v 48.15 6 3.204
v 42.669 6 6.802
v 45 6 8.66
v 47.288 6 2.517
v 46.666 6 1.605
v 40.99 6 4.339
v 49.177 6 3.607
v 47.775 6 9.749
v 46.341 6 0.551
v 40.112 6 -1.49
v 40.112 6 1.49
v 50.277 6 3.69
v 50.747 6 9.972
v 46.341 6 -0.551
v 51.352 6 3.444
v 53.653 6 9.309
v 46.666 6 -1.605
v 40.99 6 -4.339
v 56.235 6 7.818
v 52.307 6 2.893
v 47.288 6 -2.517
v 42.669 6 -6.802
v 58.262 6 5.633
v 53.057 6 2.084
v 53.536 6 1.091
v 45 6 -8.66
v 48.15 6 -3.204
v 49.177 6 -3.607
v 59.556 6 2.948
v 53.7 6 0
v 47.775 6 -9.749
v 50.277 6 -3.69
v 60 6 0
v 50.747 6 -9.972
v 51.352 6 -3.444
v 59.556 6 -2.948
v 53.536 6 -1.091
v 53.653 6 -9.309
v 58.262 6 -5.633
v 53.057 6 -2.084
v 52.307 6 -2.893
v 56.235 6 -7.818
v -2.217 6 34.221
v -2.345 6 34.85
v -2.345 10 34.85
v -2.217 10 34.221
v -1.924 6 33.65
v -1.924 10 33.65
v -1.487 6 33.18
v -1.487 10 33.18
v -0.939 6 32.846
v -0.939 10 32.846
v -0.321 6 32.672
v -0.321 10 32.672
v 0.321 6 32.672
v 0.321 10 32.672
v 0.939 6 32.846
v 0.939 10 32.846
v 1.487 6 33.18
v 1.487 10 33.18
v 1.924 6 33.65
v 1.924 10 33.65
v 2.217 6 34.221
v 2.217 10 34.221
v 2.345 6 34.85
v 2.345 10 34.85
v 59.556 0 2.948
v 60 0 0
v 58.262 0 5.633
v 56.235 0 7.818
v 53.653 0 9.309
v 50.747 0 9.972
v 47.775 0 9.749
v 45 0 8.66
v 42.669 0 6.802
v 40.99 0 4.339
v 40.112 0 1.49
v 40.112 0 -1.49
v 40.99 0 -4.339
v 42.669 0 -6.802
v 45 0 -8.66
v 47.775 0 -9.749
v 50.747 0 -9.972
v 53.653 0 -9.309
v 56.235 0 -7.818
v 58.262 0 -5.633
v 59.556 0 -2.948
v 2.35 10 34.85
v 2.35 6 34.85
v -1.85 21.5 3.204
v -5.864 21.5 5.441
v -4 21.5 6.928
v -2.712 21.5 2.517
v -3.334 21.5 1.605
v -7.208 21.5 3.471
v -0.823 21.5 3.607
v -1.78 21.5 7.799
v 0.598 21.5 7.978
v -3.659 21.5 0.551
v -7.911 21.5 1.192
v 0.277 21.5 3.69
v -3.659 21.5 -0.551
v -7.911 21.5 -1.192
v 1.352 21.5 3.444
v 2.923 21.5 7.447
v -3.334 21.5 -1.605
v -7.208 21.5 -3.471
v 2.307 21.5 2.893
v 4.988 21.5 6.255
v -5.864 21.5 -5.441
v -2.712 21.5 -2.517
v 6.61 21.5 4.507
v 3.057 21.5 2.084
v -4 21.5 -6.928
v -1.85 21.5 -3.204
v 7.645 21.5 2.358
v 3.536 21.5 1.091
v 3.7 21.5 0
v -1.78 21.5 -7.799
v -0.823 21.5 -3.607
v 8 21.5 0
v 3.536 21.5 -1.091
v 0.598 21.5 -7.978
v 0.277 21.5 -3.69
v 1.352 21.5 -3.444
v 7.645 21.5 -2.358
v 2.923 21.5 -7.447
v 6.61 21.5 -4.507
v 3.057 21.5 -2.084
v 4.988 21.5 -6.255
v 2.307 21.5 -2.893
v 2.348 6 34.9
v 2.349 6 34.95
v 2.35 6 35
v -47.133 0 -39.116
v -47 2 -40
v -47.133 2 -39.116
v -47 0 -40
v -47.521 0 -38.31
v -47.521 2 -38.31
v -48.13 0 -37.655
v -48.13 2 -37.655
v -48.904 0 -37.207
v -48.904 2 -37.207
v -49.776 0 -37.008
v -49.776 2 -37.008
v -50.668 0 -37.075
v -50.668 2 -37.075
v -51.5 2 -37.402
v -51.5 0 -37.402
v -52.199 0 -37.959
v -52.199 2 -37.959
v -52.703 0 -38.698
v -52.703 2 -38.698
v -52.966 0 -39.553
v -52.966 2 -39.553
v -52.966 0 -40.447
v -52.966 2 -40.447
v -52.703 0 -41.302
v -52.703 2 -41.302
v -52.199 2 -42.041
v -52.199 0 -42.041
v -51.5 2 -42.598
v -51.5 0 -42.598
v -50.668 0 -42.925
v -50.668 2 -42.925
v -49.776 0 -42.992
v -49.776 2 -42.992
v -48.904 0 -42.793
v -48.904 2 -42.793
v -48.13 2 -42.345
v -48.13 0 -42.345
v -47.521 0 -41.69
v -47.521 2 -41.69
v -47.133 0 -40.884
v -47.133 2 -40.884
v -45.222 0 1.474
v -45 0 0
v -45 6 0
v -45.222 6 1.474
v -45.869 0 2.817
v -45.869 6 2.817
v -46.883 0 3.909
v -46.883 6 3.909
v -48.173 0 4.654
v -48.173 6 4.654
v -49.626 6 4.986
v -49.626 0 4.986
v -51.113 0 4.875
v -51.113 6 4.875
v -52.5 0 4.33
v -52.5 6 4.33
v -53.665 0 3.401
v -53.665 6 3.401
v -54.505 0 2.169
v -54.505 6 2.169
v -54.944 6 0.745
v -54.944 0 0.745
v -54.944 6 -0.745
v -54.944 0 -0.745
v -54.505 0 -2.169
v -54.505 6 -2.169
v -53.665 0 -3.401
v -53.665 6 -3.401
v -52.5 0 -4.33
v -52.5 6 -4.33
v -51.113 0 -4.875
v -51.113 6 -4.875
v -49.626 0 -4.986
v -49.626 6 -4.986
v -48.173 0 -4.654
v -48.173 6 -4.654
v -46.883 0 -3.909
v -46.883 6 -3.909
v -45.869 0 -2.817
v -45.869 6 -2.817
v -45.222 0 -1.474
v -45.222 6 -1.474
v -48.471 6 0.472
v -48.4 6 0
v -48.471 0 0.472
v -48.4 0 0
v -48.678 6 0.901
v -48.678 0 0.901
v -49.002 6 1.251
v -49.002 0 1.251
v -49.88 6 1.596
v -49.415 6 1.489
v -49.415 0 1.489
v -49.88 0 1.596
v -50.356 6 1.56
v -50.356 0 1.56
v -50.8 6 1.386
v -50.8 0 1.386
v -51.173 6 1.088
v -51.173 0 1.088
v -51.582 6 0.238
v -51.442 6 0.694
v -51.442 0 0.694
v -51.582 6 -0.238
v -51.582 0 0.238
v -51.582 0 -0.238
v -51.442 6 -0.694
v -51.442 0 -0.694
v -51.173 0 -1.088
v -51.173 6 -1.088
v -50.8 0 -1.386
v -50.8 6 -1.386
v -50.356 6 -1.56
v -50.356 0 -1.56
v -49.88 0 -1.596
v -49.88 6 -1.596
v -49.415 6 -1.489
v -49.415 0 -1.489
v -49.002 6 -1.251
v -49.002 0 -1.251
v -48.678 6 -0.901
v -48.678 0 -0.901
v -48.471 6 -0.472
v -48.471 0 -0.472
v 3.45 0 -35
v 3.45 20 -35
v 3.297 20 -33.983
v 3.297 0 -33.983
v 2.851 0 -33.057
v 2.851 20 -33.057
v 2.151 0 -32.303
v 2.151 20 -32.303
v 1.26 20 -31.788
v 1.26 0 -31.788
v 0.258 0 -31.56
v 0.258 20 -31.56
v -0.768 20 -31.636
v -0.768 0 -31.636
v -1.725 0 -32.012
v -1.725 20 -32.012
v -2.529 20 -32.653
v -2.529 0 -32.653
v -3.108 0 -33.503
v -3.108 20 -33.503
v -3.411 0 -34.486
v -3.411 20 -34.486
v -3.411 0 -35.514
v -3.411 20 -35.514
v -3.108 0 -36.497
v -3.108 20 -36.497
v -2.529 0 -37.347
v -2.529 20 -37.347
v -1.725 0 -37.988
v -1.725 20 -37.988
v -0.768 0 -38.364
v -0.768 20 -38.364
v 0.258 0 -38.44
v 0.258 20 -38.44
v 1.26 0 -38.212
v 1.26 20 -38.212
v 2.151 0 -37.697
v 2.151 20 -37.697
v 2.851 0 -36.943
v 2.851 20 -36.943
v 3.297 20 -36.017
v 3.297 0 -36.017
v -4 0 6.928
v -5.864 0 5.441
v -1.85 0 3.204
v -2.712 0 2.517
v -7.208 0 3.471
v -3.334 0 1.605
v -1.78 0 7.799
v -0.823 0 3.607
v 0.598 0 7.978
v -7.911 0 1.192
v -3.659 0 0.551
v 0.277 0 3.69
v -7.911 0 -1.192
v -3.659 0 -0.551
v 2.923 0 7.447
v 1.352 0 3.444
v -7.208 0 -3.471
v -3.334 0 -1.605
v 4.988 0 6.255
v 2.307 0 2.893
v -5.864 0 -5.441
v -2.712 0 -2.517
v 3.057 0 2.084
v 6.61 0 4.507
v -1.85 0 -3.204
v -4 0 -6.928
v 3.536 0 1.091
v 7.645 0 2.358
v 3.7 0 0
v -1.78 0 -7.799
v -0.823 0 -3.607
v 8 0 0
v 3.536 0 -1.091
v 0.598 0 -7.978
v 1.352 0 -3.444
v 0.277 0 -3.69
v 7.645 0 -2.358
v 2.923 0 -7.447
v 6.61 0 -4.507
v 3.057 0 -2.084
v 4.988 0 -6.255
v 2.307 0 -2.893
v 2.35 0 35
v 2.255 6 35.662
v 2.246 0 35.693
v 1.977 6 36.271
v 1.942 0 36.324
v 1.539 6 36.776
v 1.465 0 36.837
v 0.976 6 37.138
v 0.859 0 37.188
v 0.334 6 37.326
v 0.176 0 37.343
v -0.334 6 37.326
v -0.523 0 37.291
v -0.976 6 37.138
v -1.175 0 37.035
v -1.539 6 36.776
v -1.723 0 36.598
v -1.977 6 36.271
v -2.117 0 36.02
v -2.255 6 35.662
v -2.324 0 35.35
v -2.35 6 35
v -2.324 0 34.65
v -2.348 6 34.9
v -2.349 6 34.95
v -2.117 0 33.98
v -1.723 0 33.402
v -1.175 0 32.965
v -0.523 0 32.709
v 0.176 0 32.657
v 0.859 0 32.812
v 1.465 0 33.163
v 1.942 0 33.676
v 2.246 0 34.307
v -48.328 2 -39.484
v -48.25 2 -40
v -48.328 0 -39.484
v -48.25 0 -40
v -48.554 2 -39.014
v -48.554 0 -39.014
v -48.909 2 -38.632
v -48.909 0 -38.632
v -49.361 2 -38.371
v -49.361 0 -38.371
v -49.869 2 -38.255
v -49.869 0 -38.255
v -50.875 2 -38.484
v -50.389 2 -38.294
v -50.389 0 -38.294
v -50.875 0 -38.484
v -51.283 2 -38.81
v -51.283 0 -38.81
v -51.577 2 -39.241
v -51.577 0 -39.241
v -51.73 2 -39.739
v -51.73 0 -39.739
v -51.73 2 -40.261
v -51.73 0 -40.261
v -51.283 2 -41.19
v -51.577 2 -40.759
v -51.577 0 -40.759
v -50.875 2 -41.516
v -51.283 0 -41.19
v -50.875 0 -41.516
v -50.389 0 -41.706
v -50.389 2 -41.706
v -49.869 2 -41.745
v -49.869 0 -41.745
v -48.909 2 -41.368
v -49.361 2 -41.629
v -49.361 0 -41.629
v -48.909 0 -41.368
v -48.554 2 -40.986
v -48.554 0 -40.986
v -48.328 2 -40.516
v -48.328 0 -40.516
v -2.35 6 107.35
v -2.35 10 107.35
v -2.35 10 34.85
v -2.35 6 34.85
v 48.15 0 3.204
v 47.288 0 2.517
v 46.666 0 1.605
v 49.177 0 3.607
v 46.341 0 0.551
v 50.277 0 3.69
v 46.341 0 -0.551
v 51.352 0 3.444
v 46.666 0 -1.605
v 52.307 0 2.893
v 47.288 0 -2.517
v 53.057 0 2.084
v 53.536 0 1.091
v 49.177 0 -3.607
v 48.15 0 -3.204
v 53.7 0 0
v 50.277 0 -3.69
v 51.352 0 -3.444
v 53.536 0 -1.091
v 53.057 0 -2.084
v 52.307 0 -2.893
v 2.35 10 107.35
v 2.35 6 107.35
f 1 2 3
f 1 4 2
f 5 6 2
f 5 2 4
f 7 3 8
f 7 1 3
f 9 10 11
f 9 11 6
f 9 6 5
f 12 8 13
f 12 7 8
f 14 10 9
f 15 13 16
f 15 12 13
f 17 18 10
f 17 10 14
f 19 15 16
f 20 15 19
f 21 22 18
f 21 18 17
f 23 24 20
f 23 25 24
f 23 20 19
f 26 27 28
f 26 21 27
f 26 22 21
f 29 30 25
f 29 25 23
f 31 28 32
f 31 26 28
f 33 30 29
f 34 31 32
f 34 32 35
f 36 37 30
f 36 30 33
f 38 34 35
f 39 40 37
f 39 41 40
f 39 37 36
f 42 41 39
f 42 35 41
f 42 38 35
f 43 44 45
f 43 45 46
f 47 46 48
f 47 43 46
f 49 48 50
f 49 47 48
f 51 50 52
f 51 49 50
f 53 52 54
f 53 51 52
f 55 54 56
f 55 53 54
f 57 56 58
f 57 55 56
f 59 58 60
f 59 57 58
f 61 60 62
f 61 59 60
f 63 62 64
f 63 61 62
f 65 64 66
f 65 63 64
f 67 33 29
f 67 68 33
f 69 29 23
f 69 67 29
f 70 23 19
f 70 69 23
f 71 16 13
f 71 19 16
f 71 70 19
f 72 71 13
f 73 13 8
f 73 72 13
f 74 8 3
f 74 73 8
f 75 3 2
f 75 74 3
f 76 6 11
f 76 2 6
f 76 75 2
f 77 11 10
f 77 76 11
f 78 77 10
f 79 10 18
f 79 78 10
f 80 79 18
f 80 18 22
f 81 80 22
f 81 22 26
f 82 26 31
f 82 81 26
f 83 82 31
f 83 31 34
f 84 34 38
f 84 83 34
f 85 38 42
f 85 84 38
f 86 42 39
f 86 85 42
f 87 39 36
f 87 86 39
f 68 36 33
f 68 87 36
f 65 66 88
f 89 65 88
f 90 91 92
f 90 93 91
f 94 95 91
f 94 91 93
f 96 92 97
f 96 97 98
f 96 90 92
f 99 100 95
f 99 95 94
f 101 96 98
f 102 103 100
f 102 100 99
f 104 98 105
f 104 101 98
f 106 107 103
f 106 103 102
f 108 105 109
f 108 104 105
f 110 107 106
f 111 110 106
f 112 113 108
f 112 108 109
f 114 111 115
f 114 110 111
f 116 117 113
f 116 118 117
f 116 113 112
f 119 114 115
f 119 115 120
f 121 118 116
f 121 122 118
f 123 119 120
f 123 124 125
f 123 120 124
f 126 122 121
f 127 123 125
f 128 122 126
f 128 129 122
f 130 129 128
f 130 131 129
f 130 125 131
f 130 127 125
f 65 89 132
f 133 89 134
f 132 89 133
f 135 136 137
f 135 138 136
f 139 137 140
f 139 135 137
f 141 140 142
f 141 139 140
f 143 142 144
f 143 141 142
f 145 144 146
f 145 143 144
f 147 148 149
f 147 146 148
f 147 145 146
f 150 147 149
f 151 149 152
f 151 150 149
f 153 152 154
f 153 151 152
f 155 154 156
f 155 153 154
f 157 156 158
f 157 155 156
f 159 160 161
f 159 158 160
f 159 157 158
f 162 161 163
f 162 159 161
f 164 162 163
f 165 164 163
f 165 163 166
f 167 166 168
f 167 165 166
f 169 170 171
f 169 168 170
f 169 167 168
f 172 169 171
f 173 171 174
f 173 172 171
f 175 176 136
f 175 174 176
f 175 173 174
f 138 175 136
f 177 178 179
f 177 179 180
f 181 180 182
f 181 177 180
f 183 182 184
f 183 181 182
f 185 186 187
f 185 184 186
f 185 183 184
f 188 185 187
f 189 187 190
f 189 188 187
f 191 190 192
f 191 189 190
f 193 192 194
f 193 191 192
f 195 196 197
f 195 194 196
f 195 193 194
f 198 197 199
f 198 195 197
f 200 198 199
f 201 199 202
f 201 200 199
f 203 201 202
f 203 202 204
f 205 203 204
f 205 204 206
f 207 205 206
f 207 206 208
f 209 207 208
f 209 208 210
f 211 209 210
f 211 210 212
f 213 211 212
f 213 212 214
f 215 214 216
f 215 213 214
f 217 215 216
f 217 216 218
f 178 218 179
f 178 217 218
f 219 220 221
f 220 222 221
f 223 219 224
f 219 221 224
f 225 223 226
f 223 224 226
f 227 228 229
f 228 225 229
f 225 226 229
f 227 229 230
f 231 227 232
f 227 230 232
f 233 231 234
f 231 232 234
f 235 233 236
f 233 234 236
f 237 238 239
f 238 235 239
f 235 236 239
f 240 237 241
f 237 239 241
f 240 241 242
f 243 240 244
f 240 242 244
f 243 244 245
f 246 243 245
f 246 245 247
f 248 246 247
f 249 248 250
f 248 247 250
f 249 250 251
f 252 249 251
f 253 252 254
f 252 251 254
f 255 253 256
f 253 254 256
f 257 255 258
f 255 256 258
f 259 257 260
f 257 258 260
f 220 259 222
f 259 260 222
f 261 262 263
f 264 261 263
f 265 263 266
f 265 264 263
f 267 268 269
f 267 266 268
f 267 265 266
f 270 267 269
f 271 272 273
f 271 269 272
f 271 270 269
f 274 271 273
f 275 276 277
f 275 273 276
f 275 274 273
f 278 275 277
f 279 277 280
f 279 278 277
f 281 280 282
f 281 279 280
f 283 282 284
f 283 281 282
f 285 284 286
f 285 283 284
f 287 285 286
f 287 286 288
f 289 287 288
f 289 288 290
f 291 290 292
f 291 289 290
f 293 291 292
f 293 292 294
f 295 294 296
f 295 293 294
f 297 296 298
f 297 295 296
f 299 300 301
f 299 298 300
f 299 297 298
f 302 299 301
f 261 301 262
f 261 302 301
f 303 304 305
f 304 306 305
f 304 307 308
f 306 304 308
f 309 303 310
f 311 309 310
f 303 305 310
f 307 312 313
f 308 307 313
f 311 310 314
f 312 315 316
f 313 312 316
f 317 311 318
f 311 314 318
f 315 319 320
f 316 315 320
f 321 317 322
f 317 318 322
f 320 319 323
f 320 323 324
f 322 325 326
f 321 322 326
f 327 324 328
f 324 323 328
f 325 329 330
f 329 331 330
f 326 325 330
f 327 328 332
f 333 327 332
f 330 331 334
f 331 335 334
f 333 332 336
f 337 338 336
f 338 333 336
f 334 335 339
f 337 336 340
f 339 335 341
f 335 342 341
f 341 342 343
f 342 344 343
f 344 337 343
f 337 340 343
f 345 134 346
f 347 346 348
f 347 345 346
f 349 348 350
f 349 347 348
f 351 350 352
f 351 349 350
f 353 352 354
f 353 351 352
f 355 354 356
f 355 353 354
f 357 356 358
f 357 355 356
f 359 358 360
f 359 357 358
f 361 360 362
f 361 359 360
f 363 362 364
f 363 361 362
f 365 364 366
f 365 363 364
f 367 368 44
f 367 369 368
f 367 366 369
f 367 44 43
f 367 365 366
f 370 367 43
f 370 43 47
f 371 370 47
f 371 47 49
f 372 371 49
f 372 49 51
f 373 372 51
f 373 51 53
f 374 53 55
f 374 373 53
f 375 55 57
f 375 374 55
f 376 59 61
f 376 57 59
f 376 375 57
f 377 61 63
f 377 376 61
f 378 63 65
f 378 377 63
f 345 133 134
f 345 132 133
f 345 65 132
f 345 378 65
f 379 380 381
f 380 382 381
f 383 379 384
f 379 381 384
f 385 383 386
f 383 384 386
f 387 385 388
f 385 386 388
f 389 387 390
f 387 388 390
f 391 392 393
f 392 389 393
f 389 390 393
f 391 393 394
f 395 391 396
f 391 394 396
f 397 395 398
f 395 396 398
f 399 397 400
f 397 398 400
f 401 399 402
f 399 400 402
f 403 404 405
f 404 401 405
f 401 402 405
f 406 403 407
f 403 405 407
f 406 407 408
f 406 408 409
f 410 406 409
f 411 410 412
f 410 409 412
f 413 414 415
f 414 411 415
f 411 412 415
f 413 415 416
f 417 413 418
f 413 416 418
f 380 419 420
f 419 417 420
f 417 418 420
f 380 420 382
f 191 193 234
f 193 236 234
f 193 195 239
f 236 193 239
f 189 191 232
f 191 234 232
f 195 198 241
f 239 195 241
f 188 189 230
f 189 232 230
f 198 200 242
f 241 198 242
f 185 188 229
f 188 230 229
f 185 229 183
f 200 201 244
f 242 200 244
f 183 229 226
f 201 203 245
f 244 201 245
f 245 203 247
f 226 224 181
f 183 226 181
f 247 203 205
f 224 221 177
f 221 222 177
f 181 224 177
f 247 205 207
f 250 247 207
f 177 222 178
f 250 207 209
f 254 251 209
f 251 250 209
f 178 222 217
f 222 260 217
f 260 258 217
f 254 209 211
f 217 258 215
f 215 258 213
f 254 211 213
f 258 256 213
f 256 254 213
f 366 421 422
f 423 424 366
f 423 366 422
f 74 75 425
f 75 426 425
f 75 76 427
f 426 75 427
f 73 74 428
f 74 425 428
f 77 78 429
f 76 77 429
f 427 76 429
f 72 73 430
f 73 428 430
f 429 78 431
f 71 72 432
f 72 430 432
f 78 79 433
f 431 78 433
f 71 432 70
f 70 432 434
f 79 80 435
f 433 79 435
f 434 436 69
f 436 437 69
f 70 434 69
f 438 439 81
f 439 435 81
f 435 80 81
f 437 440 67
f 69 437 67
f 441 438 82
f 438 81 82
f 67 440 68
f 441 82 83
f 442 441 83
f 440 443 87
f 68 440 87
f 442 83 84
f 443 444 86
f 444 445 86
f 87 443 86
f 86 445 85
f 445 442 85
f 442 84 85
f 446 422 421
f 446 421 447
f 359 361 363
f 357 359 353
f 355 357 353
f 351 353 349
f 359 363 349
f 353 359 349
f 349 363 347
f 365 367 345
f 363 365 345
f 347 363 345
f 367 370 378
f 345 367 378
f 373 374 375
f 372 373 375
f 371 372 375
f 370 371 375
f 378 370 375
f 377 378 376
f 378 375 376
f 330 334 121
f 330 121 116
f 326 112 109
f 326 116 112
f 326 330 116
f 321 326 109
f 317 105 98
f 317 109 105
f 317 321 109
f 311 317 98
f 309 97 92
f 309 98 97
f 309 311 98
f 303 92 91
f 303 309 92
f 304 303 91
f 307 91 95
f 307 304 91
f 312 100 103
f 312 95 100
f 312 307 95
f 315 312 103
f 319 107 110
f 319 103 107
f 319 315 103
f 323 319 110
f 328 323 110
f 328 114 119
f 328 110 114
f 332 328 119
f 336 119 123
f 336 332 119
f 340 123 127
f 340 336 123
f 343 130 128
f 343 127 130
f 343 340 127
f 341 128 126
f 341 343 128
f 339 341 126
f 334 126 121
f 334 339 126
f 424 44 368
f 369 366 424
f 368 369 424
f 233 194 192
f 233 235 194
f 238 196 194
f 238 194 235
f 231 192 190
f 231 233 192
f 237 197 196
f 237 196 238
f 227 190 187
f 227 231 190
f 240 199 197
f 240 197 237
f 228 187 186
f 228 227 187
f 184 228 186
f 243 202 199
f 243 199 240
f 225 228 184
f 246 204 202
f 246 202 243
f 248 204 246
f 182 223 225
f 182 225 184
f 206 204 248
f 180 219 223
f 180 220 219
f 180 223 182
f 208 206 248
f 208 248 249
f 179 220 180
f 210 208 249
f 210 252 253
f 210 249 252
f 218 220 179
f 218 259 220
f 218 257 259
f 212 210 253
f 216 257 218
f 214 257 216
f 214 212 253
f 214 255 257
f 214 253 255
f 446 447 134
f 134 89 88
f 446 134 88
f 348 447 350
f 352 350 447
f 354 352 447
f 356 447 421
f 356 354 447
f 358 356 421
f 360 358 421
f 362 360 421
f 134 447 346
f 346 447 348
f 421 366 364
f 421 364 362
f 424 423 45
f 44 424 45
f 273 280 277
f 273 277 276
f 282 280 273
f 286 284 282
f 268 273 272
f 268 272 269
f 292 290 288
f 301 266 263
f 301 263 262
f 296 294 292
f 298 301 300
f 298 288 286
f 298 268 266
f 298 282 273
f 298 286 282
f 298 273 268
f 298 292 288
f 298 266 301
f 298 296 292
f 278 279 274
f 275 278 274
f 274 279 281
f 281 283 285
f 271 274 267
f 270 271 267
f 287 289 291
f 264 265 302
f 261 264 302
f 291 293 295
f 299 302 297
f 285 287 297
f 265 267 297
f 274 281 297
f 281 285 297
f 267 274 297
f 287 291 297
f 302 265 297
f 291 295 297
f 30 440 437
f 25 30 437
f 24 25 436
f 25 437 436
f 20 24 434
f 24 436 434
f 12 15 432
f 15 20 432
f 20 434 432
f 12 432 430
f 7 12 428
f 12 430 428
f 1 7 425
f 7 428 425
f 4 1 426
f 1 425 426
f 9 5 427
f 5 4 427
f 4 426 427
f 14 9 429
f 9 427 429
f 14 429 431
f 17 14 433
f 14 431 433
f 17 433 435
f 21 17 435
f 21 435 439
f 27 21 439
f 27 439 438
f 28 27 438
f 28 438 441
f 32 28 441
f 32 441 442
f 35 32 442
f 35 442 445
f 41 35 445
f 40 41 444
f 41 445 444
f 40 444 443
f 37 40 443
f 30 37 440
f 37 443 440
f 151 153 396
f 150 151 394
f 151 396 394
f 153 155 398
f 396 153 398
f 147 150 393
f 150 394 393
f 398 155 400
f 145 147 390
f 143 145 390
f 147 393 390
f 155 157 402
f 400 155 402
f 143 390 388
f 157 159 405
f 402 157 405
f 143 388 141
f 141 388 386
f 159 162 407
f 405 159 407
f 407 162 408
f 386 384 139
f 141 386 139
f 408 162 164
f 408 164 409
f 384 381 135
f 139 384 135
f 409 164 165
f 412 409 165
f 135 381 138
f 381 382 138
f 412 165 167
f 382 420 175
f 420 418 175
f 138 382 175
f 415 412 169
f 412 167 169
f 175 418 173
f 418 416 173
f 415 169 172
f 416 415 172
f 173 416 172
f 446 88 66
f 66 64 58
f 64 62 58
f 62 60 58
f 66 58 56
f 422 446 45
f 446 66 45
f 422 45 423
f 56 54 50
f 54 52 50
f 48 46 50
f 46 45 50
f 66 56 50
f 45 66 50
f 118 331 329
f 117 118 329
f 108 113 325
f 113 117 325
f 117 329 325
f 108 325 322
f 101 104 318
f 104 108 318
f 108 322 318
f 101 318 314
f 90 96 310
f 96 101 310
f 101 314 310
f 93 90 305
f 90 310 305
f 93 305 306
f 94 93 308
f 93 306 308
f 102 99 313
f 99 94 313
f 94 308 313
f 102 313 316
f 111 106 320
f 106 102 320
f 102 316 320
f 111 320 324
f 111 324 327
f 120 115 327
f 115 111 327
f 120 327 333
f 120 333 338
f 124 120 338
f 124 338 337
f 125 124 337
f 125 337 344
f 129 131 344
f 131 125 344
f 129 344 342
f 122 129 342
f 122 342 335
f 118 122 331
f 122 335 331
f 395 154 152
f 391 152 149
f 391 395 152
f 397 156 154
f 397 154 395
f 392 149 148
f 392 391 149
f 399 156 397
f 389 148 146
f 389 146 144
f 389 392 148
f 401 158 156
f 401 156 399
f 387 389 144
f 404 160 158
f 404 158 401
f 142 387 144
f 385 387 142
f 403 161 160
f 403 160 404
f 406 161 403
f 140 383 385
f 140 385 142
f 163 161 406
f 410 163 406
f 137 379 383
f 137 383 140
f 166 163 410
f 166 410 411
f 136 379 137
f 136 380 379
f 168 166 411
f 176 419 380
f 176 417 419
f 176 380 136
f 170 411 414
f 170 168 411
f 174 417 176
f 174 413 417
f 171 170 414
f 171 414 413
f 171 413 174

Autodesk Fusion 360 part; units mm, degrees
sketch "Sketch1" plane through (0, 0, 0) normal (0, 1, 0) x (1, 0, 0)
  circle A0 centre (0, 0) radius 3.7
  circle A1 centre (0, 0) radius 8
  dimension "d1" = 7.4
  dimension "d2" = 16
extrude "Extrude1" add sketch "Sketch1" along normal blind 21.5 makes body 1
sketch "Sketch2" plane through (0, 0, 0) normal (0, 1, 0) x (1, 0, 0)
  circle A0 centre (-50, 0) radius 1.6
  circle A1 centre (-50, 0) radius 5
  dimension "d5" = 3.2
  dimension "d6" = 10
extrude "Extrude2" add sketch "Sketch2" along normal blind 6 separate body makes body 2
sketch "Sketch3" plane through (0, 0, 0) normal (0, 1, 0) x (1, 0, 0)
  circle A0 centre (50, 0) radius 3.7
  circle A1 centre (50, 0) radius 10
  dimension "d9" = 7.4
  dimension "d10" = 20
extrude "Extrude3" add sketch "Sketch3" along normal blind 6 separate body makes body 3
sketch "Sketch4" plane through (0, 0, 0) normal (0, 1, 0) x (1, 0, 0)
  circle A0 centre (0, 35) radius 3.45
  dimension "d13" = 6.9
extrude "Extrude4" add sketch "Sketch4" along normal blind 20 separate body makes body 4
sketch "Sketch5" plane through (0, 0, 0) normal (0, 1, 0) x (1, 0, 0)
  circle A0 centre (0, -35) radius 2.35
  dimension "d16" = 4.7
extrude "Extrude5" add sketch "Sketch5" along normal blind 6 separate body makes body 5
sketch "Sketch6" plane through (0, 6, 0) normal (0, 1, 0) x (-1, 0, 0)
  circle A0 centre (0, 35) radius 2.35
  circle A1 centre (0, 35) radius 2.35
extrude "Extrude6" add sketch "Sketch6" along normal blind 4 bodies 5
ref_plane "WorkPlane1" through (0, 6.5991, 37.35) normal (0, 0, 1) x (-1, 0, 0)
sketch "Sketch7" plane through (0, 6.5991, 37.35) normal (0, 0, 1) x (1, 0, 0)
  line L0 (2.35, 3.4009) -> (-2.35, 3.4009)
  line L1 (2.35, -6.5991) -> (-2.35, -6.5991)
  line L2 (2.35, -6.5991) -> (2.35, 3.4009)
  line L3 (-2.35, -6.5991) -> (-2.35, 3.4009)
  line L4 (-2.35, 3.4009) -> (2.35, 3.4009)
  line L5 (2.35, 3.4009) -> (2.35, -0.5991)
  line L6 (2.35, -0.5991) -> (-2.35, -0.5991)
  line L7 (-2.35, -0.5991) -> (-2.35, 3.4009)
  dimension "d22" = 4
extrude "Extrude7" add sketch "Sketch7" along normal blind 70 separate body contours L0 L2 L3 L4 L5 L6 L7 makes body 6
extrude "Extrude8" add 1 faces at (-0.7833, 8.6667, 37.35) along direction (0, 0, -1) blind 2.5 on bodies 6 bodies 6 5
sketch "Sketch8" plane through (0, 0, 0) normal (0, 1, 0) x (1, 0, 0)
  circle A0 centre (-50, 40) radius 1.75
  circle A1 centre (-50, 40) radius 3
  dimension "d27" = 3.5
  dimension "d28" = 6
extrude "Extrude9" add sketch "Sketch8" along normal blind 2 separate body makes body 7
